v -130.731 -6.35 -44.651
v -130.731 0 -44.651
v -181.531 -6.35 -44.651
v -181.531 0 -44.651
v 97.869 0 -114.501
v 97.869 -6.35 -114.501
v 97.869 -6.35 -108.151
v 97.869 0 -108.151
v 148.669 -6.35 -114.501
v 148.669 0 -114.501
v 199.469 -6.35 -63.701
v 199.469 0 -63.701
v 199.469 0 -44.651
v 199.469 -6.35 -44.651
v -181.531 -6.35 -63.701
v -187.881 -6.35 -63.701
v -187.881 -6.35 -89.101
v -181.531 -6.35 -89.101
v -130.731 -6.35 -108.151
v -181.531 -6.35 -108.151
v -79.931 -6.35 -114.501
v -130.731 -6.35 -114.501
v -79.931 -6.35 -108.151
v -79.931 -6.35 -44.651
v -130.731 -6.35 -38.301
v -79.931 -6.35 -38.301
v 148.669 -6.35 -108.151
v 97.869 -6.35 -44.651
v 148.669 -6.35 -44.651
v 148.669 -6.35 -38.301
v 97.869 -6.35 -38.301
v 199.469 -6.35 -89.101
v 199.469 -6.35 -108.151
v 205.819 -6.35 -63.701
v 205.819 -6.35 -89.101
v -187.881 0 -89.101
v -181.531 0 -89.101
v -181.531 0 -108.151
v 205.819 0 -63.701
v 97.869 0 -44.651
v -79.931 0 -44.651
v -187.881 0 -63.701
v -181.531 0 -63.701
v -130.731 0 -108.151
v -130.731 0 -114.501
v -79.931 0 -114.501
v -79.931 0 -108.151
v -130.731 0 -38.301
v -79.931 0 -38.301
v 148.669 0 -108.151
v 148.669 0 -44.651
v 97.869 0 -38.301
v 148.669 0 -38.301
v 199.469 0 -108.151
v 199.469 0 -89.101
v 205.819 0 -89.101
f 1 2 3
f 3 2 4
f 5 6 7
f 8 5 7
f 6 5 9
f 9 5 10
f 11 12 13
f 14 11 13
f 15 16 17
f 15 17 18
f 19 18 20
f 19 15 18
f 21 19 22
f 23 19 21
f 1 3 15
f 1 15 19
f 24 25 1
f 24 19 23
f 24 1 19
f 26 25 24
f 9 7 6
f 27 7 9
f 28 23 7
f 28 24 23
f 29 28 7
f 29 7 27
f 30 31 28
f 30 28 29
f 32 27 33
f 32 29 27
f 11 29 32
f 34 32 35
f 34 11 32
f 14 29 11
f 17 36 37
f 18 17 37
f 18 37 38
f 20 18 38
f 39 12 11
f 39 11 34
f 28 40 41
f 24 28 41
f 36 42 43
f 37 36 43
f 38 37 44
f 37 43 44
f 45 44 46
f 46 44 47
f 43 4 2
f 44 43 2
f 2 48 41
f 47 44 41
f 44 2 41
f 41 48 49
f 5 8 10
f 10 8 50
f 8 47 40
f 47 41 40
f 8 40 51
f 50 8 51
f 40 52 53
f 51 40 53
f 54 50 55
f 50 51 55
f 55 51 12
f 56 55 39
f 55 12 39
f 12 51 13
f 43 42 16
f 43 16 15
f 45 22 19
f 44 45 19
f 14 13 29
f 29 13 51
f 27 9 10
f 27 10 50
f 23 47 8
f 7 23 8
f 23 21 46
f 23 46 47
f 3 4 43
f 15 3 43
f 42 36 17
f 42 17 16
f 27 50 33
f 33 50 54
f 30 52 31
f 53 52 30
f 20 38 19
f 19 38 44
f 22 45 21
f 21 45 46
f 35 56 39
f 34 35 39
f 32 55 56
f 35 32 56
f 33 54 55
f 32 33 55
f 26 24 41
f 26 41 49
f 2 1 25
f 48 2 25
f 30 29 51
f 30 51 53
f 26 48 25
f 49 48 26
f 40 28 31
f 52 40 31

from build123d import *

# Parameters (mm, degrees)
F0_W     = 50.8
F0_H     = 6.35
F0_W_2   = 6.35
F0_H_2   = 25.4
F1_DEPTH = 6.35


with BuildPart() as f1:
    # F0 (on Front) → F1 (new body)
    with BuildSketch(Plane.XZ):
        Polygon((-181.531138, -89.100668), (-181.531138, -108.150668), (-130.731138, -108.150668), (-79.931138, -108.150668), (97.868862, -108.150668), (148.668862, -108.150668), (199.468862, -108.150668), (199.468862, -89.100668), (199.468862, -63.700668), (199.468862, -44.650668), (148.668862, -44.650668), (97.868862, -44.650668), (-79.931138, -44.650668), (-130.731138, -44.650668), (-181.531138, -44.650668), (-181.531138, -63.700668), align=None)
        with Locations((-105.331138, -41.475668)):
            Rectangle(F0_W, F0_H)
        with Locations((-184.706138, -76.400668)):
            Rectangle(F0_W_2, F0_H_2)
        with Locations((-105.331138, -111.325668)):
            Rectangle(F0_W, F0_H)
        with Locations((123.268862, -111.325668)):
            Rectangle(F0_W, F0_H)
        with Locations((123.268862, -41.475668)):
            Rectangle(F0_W, F0_H)
        with Locations((202.643862, -76.400668)):
            Rectangle(F0_W_2, F0_H_2)
    extrude(amount=F1_DEPTH)


solid = f1.part
